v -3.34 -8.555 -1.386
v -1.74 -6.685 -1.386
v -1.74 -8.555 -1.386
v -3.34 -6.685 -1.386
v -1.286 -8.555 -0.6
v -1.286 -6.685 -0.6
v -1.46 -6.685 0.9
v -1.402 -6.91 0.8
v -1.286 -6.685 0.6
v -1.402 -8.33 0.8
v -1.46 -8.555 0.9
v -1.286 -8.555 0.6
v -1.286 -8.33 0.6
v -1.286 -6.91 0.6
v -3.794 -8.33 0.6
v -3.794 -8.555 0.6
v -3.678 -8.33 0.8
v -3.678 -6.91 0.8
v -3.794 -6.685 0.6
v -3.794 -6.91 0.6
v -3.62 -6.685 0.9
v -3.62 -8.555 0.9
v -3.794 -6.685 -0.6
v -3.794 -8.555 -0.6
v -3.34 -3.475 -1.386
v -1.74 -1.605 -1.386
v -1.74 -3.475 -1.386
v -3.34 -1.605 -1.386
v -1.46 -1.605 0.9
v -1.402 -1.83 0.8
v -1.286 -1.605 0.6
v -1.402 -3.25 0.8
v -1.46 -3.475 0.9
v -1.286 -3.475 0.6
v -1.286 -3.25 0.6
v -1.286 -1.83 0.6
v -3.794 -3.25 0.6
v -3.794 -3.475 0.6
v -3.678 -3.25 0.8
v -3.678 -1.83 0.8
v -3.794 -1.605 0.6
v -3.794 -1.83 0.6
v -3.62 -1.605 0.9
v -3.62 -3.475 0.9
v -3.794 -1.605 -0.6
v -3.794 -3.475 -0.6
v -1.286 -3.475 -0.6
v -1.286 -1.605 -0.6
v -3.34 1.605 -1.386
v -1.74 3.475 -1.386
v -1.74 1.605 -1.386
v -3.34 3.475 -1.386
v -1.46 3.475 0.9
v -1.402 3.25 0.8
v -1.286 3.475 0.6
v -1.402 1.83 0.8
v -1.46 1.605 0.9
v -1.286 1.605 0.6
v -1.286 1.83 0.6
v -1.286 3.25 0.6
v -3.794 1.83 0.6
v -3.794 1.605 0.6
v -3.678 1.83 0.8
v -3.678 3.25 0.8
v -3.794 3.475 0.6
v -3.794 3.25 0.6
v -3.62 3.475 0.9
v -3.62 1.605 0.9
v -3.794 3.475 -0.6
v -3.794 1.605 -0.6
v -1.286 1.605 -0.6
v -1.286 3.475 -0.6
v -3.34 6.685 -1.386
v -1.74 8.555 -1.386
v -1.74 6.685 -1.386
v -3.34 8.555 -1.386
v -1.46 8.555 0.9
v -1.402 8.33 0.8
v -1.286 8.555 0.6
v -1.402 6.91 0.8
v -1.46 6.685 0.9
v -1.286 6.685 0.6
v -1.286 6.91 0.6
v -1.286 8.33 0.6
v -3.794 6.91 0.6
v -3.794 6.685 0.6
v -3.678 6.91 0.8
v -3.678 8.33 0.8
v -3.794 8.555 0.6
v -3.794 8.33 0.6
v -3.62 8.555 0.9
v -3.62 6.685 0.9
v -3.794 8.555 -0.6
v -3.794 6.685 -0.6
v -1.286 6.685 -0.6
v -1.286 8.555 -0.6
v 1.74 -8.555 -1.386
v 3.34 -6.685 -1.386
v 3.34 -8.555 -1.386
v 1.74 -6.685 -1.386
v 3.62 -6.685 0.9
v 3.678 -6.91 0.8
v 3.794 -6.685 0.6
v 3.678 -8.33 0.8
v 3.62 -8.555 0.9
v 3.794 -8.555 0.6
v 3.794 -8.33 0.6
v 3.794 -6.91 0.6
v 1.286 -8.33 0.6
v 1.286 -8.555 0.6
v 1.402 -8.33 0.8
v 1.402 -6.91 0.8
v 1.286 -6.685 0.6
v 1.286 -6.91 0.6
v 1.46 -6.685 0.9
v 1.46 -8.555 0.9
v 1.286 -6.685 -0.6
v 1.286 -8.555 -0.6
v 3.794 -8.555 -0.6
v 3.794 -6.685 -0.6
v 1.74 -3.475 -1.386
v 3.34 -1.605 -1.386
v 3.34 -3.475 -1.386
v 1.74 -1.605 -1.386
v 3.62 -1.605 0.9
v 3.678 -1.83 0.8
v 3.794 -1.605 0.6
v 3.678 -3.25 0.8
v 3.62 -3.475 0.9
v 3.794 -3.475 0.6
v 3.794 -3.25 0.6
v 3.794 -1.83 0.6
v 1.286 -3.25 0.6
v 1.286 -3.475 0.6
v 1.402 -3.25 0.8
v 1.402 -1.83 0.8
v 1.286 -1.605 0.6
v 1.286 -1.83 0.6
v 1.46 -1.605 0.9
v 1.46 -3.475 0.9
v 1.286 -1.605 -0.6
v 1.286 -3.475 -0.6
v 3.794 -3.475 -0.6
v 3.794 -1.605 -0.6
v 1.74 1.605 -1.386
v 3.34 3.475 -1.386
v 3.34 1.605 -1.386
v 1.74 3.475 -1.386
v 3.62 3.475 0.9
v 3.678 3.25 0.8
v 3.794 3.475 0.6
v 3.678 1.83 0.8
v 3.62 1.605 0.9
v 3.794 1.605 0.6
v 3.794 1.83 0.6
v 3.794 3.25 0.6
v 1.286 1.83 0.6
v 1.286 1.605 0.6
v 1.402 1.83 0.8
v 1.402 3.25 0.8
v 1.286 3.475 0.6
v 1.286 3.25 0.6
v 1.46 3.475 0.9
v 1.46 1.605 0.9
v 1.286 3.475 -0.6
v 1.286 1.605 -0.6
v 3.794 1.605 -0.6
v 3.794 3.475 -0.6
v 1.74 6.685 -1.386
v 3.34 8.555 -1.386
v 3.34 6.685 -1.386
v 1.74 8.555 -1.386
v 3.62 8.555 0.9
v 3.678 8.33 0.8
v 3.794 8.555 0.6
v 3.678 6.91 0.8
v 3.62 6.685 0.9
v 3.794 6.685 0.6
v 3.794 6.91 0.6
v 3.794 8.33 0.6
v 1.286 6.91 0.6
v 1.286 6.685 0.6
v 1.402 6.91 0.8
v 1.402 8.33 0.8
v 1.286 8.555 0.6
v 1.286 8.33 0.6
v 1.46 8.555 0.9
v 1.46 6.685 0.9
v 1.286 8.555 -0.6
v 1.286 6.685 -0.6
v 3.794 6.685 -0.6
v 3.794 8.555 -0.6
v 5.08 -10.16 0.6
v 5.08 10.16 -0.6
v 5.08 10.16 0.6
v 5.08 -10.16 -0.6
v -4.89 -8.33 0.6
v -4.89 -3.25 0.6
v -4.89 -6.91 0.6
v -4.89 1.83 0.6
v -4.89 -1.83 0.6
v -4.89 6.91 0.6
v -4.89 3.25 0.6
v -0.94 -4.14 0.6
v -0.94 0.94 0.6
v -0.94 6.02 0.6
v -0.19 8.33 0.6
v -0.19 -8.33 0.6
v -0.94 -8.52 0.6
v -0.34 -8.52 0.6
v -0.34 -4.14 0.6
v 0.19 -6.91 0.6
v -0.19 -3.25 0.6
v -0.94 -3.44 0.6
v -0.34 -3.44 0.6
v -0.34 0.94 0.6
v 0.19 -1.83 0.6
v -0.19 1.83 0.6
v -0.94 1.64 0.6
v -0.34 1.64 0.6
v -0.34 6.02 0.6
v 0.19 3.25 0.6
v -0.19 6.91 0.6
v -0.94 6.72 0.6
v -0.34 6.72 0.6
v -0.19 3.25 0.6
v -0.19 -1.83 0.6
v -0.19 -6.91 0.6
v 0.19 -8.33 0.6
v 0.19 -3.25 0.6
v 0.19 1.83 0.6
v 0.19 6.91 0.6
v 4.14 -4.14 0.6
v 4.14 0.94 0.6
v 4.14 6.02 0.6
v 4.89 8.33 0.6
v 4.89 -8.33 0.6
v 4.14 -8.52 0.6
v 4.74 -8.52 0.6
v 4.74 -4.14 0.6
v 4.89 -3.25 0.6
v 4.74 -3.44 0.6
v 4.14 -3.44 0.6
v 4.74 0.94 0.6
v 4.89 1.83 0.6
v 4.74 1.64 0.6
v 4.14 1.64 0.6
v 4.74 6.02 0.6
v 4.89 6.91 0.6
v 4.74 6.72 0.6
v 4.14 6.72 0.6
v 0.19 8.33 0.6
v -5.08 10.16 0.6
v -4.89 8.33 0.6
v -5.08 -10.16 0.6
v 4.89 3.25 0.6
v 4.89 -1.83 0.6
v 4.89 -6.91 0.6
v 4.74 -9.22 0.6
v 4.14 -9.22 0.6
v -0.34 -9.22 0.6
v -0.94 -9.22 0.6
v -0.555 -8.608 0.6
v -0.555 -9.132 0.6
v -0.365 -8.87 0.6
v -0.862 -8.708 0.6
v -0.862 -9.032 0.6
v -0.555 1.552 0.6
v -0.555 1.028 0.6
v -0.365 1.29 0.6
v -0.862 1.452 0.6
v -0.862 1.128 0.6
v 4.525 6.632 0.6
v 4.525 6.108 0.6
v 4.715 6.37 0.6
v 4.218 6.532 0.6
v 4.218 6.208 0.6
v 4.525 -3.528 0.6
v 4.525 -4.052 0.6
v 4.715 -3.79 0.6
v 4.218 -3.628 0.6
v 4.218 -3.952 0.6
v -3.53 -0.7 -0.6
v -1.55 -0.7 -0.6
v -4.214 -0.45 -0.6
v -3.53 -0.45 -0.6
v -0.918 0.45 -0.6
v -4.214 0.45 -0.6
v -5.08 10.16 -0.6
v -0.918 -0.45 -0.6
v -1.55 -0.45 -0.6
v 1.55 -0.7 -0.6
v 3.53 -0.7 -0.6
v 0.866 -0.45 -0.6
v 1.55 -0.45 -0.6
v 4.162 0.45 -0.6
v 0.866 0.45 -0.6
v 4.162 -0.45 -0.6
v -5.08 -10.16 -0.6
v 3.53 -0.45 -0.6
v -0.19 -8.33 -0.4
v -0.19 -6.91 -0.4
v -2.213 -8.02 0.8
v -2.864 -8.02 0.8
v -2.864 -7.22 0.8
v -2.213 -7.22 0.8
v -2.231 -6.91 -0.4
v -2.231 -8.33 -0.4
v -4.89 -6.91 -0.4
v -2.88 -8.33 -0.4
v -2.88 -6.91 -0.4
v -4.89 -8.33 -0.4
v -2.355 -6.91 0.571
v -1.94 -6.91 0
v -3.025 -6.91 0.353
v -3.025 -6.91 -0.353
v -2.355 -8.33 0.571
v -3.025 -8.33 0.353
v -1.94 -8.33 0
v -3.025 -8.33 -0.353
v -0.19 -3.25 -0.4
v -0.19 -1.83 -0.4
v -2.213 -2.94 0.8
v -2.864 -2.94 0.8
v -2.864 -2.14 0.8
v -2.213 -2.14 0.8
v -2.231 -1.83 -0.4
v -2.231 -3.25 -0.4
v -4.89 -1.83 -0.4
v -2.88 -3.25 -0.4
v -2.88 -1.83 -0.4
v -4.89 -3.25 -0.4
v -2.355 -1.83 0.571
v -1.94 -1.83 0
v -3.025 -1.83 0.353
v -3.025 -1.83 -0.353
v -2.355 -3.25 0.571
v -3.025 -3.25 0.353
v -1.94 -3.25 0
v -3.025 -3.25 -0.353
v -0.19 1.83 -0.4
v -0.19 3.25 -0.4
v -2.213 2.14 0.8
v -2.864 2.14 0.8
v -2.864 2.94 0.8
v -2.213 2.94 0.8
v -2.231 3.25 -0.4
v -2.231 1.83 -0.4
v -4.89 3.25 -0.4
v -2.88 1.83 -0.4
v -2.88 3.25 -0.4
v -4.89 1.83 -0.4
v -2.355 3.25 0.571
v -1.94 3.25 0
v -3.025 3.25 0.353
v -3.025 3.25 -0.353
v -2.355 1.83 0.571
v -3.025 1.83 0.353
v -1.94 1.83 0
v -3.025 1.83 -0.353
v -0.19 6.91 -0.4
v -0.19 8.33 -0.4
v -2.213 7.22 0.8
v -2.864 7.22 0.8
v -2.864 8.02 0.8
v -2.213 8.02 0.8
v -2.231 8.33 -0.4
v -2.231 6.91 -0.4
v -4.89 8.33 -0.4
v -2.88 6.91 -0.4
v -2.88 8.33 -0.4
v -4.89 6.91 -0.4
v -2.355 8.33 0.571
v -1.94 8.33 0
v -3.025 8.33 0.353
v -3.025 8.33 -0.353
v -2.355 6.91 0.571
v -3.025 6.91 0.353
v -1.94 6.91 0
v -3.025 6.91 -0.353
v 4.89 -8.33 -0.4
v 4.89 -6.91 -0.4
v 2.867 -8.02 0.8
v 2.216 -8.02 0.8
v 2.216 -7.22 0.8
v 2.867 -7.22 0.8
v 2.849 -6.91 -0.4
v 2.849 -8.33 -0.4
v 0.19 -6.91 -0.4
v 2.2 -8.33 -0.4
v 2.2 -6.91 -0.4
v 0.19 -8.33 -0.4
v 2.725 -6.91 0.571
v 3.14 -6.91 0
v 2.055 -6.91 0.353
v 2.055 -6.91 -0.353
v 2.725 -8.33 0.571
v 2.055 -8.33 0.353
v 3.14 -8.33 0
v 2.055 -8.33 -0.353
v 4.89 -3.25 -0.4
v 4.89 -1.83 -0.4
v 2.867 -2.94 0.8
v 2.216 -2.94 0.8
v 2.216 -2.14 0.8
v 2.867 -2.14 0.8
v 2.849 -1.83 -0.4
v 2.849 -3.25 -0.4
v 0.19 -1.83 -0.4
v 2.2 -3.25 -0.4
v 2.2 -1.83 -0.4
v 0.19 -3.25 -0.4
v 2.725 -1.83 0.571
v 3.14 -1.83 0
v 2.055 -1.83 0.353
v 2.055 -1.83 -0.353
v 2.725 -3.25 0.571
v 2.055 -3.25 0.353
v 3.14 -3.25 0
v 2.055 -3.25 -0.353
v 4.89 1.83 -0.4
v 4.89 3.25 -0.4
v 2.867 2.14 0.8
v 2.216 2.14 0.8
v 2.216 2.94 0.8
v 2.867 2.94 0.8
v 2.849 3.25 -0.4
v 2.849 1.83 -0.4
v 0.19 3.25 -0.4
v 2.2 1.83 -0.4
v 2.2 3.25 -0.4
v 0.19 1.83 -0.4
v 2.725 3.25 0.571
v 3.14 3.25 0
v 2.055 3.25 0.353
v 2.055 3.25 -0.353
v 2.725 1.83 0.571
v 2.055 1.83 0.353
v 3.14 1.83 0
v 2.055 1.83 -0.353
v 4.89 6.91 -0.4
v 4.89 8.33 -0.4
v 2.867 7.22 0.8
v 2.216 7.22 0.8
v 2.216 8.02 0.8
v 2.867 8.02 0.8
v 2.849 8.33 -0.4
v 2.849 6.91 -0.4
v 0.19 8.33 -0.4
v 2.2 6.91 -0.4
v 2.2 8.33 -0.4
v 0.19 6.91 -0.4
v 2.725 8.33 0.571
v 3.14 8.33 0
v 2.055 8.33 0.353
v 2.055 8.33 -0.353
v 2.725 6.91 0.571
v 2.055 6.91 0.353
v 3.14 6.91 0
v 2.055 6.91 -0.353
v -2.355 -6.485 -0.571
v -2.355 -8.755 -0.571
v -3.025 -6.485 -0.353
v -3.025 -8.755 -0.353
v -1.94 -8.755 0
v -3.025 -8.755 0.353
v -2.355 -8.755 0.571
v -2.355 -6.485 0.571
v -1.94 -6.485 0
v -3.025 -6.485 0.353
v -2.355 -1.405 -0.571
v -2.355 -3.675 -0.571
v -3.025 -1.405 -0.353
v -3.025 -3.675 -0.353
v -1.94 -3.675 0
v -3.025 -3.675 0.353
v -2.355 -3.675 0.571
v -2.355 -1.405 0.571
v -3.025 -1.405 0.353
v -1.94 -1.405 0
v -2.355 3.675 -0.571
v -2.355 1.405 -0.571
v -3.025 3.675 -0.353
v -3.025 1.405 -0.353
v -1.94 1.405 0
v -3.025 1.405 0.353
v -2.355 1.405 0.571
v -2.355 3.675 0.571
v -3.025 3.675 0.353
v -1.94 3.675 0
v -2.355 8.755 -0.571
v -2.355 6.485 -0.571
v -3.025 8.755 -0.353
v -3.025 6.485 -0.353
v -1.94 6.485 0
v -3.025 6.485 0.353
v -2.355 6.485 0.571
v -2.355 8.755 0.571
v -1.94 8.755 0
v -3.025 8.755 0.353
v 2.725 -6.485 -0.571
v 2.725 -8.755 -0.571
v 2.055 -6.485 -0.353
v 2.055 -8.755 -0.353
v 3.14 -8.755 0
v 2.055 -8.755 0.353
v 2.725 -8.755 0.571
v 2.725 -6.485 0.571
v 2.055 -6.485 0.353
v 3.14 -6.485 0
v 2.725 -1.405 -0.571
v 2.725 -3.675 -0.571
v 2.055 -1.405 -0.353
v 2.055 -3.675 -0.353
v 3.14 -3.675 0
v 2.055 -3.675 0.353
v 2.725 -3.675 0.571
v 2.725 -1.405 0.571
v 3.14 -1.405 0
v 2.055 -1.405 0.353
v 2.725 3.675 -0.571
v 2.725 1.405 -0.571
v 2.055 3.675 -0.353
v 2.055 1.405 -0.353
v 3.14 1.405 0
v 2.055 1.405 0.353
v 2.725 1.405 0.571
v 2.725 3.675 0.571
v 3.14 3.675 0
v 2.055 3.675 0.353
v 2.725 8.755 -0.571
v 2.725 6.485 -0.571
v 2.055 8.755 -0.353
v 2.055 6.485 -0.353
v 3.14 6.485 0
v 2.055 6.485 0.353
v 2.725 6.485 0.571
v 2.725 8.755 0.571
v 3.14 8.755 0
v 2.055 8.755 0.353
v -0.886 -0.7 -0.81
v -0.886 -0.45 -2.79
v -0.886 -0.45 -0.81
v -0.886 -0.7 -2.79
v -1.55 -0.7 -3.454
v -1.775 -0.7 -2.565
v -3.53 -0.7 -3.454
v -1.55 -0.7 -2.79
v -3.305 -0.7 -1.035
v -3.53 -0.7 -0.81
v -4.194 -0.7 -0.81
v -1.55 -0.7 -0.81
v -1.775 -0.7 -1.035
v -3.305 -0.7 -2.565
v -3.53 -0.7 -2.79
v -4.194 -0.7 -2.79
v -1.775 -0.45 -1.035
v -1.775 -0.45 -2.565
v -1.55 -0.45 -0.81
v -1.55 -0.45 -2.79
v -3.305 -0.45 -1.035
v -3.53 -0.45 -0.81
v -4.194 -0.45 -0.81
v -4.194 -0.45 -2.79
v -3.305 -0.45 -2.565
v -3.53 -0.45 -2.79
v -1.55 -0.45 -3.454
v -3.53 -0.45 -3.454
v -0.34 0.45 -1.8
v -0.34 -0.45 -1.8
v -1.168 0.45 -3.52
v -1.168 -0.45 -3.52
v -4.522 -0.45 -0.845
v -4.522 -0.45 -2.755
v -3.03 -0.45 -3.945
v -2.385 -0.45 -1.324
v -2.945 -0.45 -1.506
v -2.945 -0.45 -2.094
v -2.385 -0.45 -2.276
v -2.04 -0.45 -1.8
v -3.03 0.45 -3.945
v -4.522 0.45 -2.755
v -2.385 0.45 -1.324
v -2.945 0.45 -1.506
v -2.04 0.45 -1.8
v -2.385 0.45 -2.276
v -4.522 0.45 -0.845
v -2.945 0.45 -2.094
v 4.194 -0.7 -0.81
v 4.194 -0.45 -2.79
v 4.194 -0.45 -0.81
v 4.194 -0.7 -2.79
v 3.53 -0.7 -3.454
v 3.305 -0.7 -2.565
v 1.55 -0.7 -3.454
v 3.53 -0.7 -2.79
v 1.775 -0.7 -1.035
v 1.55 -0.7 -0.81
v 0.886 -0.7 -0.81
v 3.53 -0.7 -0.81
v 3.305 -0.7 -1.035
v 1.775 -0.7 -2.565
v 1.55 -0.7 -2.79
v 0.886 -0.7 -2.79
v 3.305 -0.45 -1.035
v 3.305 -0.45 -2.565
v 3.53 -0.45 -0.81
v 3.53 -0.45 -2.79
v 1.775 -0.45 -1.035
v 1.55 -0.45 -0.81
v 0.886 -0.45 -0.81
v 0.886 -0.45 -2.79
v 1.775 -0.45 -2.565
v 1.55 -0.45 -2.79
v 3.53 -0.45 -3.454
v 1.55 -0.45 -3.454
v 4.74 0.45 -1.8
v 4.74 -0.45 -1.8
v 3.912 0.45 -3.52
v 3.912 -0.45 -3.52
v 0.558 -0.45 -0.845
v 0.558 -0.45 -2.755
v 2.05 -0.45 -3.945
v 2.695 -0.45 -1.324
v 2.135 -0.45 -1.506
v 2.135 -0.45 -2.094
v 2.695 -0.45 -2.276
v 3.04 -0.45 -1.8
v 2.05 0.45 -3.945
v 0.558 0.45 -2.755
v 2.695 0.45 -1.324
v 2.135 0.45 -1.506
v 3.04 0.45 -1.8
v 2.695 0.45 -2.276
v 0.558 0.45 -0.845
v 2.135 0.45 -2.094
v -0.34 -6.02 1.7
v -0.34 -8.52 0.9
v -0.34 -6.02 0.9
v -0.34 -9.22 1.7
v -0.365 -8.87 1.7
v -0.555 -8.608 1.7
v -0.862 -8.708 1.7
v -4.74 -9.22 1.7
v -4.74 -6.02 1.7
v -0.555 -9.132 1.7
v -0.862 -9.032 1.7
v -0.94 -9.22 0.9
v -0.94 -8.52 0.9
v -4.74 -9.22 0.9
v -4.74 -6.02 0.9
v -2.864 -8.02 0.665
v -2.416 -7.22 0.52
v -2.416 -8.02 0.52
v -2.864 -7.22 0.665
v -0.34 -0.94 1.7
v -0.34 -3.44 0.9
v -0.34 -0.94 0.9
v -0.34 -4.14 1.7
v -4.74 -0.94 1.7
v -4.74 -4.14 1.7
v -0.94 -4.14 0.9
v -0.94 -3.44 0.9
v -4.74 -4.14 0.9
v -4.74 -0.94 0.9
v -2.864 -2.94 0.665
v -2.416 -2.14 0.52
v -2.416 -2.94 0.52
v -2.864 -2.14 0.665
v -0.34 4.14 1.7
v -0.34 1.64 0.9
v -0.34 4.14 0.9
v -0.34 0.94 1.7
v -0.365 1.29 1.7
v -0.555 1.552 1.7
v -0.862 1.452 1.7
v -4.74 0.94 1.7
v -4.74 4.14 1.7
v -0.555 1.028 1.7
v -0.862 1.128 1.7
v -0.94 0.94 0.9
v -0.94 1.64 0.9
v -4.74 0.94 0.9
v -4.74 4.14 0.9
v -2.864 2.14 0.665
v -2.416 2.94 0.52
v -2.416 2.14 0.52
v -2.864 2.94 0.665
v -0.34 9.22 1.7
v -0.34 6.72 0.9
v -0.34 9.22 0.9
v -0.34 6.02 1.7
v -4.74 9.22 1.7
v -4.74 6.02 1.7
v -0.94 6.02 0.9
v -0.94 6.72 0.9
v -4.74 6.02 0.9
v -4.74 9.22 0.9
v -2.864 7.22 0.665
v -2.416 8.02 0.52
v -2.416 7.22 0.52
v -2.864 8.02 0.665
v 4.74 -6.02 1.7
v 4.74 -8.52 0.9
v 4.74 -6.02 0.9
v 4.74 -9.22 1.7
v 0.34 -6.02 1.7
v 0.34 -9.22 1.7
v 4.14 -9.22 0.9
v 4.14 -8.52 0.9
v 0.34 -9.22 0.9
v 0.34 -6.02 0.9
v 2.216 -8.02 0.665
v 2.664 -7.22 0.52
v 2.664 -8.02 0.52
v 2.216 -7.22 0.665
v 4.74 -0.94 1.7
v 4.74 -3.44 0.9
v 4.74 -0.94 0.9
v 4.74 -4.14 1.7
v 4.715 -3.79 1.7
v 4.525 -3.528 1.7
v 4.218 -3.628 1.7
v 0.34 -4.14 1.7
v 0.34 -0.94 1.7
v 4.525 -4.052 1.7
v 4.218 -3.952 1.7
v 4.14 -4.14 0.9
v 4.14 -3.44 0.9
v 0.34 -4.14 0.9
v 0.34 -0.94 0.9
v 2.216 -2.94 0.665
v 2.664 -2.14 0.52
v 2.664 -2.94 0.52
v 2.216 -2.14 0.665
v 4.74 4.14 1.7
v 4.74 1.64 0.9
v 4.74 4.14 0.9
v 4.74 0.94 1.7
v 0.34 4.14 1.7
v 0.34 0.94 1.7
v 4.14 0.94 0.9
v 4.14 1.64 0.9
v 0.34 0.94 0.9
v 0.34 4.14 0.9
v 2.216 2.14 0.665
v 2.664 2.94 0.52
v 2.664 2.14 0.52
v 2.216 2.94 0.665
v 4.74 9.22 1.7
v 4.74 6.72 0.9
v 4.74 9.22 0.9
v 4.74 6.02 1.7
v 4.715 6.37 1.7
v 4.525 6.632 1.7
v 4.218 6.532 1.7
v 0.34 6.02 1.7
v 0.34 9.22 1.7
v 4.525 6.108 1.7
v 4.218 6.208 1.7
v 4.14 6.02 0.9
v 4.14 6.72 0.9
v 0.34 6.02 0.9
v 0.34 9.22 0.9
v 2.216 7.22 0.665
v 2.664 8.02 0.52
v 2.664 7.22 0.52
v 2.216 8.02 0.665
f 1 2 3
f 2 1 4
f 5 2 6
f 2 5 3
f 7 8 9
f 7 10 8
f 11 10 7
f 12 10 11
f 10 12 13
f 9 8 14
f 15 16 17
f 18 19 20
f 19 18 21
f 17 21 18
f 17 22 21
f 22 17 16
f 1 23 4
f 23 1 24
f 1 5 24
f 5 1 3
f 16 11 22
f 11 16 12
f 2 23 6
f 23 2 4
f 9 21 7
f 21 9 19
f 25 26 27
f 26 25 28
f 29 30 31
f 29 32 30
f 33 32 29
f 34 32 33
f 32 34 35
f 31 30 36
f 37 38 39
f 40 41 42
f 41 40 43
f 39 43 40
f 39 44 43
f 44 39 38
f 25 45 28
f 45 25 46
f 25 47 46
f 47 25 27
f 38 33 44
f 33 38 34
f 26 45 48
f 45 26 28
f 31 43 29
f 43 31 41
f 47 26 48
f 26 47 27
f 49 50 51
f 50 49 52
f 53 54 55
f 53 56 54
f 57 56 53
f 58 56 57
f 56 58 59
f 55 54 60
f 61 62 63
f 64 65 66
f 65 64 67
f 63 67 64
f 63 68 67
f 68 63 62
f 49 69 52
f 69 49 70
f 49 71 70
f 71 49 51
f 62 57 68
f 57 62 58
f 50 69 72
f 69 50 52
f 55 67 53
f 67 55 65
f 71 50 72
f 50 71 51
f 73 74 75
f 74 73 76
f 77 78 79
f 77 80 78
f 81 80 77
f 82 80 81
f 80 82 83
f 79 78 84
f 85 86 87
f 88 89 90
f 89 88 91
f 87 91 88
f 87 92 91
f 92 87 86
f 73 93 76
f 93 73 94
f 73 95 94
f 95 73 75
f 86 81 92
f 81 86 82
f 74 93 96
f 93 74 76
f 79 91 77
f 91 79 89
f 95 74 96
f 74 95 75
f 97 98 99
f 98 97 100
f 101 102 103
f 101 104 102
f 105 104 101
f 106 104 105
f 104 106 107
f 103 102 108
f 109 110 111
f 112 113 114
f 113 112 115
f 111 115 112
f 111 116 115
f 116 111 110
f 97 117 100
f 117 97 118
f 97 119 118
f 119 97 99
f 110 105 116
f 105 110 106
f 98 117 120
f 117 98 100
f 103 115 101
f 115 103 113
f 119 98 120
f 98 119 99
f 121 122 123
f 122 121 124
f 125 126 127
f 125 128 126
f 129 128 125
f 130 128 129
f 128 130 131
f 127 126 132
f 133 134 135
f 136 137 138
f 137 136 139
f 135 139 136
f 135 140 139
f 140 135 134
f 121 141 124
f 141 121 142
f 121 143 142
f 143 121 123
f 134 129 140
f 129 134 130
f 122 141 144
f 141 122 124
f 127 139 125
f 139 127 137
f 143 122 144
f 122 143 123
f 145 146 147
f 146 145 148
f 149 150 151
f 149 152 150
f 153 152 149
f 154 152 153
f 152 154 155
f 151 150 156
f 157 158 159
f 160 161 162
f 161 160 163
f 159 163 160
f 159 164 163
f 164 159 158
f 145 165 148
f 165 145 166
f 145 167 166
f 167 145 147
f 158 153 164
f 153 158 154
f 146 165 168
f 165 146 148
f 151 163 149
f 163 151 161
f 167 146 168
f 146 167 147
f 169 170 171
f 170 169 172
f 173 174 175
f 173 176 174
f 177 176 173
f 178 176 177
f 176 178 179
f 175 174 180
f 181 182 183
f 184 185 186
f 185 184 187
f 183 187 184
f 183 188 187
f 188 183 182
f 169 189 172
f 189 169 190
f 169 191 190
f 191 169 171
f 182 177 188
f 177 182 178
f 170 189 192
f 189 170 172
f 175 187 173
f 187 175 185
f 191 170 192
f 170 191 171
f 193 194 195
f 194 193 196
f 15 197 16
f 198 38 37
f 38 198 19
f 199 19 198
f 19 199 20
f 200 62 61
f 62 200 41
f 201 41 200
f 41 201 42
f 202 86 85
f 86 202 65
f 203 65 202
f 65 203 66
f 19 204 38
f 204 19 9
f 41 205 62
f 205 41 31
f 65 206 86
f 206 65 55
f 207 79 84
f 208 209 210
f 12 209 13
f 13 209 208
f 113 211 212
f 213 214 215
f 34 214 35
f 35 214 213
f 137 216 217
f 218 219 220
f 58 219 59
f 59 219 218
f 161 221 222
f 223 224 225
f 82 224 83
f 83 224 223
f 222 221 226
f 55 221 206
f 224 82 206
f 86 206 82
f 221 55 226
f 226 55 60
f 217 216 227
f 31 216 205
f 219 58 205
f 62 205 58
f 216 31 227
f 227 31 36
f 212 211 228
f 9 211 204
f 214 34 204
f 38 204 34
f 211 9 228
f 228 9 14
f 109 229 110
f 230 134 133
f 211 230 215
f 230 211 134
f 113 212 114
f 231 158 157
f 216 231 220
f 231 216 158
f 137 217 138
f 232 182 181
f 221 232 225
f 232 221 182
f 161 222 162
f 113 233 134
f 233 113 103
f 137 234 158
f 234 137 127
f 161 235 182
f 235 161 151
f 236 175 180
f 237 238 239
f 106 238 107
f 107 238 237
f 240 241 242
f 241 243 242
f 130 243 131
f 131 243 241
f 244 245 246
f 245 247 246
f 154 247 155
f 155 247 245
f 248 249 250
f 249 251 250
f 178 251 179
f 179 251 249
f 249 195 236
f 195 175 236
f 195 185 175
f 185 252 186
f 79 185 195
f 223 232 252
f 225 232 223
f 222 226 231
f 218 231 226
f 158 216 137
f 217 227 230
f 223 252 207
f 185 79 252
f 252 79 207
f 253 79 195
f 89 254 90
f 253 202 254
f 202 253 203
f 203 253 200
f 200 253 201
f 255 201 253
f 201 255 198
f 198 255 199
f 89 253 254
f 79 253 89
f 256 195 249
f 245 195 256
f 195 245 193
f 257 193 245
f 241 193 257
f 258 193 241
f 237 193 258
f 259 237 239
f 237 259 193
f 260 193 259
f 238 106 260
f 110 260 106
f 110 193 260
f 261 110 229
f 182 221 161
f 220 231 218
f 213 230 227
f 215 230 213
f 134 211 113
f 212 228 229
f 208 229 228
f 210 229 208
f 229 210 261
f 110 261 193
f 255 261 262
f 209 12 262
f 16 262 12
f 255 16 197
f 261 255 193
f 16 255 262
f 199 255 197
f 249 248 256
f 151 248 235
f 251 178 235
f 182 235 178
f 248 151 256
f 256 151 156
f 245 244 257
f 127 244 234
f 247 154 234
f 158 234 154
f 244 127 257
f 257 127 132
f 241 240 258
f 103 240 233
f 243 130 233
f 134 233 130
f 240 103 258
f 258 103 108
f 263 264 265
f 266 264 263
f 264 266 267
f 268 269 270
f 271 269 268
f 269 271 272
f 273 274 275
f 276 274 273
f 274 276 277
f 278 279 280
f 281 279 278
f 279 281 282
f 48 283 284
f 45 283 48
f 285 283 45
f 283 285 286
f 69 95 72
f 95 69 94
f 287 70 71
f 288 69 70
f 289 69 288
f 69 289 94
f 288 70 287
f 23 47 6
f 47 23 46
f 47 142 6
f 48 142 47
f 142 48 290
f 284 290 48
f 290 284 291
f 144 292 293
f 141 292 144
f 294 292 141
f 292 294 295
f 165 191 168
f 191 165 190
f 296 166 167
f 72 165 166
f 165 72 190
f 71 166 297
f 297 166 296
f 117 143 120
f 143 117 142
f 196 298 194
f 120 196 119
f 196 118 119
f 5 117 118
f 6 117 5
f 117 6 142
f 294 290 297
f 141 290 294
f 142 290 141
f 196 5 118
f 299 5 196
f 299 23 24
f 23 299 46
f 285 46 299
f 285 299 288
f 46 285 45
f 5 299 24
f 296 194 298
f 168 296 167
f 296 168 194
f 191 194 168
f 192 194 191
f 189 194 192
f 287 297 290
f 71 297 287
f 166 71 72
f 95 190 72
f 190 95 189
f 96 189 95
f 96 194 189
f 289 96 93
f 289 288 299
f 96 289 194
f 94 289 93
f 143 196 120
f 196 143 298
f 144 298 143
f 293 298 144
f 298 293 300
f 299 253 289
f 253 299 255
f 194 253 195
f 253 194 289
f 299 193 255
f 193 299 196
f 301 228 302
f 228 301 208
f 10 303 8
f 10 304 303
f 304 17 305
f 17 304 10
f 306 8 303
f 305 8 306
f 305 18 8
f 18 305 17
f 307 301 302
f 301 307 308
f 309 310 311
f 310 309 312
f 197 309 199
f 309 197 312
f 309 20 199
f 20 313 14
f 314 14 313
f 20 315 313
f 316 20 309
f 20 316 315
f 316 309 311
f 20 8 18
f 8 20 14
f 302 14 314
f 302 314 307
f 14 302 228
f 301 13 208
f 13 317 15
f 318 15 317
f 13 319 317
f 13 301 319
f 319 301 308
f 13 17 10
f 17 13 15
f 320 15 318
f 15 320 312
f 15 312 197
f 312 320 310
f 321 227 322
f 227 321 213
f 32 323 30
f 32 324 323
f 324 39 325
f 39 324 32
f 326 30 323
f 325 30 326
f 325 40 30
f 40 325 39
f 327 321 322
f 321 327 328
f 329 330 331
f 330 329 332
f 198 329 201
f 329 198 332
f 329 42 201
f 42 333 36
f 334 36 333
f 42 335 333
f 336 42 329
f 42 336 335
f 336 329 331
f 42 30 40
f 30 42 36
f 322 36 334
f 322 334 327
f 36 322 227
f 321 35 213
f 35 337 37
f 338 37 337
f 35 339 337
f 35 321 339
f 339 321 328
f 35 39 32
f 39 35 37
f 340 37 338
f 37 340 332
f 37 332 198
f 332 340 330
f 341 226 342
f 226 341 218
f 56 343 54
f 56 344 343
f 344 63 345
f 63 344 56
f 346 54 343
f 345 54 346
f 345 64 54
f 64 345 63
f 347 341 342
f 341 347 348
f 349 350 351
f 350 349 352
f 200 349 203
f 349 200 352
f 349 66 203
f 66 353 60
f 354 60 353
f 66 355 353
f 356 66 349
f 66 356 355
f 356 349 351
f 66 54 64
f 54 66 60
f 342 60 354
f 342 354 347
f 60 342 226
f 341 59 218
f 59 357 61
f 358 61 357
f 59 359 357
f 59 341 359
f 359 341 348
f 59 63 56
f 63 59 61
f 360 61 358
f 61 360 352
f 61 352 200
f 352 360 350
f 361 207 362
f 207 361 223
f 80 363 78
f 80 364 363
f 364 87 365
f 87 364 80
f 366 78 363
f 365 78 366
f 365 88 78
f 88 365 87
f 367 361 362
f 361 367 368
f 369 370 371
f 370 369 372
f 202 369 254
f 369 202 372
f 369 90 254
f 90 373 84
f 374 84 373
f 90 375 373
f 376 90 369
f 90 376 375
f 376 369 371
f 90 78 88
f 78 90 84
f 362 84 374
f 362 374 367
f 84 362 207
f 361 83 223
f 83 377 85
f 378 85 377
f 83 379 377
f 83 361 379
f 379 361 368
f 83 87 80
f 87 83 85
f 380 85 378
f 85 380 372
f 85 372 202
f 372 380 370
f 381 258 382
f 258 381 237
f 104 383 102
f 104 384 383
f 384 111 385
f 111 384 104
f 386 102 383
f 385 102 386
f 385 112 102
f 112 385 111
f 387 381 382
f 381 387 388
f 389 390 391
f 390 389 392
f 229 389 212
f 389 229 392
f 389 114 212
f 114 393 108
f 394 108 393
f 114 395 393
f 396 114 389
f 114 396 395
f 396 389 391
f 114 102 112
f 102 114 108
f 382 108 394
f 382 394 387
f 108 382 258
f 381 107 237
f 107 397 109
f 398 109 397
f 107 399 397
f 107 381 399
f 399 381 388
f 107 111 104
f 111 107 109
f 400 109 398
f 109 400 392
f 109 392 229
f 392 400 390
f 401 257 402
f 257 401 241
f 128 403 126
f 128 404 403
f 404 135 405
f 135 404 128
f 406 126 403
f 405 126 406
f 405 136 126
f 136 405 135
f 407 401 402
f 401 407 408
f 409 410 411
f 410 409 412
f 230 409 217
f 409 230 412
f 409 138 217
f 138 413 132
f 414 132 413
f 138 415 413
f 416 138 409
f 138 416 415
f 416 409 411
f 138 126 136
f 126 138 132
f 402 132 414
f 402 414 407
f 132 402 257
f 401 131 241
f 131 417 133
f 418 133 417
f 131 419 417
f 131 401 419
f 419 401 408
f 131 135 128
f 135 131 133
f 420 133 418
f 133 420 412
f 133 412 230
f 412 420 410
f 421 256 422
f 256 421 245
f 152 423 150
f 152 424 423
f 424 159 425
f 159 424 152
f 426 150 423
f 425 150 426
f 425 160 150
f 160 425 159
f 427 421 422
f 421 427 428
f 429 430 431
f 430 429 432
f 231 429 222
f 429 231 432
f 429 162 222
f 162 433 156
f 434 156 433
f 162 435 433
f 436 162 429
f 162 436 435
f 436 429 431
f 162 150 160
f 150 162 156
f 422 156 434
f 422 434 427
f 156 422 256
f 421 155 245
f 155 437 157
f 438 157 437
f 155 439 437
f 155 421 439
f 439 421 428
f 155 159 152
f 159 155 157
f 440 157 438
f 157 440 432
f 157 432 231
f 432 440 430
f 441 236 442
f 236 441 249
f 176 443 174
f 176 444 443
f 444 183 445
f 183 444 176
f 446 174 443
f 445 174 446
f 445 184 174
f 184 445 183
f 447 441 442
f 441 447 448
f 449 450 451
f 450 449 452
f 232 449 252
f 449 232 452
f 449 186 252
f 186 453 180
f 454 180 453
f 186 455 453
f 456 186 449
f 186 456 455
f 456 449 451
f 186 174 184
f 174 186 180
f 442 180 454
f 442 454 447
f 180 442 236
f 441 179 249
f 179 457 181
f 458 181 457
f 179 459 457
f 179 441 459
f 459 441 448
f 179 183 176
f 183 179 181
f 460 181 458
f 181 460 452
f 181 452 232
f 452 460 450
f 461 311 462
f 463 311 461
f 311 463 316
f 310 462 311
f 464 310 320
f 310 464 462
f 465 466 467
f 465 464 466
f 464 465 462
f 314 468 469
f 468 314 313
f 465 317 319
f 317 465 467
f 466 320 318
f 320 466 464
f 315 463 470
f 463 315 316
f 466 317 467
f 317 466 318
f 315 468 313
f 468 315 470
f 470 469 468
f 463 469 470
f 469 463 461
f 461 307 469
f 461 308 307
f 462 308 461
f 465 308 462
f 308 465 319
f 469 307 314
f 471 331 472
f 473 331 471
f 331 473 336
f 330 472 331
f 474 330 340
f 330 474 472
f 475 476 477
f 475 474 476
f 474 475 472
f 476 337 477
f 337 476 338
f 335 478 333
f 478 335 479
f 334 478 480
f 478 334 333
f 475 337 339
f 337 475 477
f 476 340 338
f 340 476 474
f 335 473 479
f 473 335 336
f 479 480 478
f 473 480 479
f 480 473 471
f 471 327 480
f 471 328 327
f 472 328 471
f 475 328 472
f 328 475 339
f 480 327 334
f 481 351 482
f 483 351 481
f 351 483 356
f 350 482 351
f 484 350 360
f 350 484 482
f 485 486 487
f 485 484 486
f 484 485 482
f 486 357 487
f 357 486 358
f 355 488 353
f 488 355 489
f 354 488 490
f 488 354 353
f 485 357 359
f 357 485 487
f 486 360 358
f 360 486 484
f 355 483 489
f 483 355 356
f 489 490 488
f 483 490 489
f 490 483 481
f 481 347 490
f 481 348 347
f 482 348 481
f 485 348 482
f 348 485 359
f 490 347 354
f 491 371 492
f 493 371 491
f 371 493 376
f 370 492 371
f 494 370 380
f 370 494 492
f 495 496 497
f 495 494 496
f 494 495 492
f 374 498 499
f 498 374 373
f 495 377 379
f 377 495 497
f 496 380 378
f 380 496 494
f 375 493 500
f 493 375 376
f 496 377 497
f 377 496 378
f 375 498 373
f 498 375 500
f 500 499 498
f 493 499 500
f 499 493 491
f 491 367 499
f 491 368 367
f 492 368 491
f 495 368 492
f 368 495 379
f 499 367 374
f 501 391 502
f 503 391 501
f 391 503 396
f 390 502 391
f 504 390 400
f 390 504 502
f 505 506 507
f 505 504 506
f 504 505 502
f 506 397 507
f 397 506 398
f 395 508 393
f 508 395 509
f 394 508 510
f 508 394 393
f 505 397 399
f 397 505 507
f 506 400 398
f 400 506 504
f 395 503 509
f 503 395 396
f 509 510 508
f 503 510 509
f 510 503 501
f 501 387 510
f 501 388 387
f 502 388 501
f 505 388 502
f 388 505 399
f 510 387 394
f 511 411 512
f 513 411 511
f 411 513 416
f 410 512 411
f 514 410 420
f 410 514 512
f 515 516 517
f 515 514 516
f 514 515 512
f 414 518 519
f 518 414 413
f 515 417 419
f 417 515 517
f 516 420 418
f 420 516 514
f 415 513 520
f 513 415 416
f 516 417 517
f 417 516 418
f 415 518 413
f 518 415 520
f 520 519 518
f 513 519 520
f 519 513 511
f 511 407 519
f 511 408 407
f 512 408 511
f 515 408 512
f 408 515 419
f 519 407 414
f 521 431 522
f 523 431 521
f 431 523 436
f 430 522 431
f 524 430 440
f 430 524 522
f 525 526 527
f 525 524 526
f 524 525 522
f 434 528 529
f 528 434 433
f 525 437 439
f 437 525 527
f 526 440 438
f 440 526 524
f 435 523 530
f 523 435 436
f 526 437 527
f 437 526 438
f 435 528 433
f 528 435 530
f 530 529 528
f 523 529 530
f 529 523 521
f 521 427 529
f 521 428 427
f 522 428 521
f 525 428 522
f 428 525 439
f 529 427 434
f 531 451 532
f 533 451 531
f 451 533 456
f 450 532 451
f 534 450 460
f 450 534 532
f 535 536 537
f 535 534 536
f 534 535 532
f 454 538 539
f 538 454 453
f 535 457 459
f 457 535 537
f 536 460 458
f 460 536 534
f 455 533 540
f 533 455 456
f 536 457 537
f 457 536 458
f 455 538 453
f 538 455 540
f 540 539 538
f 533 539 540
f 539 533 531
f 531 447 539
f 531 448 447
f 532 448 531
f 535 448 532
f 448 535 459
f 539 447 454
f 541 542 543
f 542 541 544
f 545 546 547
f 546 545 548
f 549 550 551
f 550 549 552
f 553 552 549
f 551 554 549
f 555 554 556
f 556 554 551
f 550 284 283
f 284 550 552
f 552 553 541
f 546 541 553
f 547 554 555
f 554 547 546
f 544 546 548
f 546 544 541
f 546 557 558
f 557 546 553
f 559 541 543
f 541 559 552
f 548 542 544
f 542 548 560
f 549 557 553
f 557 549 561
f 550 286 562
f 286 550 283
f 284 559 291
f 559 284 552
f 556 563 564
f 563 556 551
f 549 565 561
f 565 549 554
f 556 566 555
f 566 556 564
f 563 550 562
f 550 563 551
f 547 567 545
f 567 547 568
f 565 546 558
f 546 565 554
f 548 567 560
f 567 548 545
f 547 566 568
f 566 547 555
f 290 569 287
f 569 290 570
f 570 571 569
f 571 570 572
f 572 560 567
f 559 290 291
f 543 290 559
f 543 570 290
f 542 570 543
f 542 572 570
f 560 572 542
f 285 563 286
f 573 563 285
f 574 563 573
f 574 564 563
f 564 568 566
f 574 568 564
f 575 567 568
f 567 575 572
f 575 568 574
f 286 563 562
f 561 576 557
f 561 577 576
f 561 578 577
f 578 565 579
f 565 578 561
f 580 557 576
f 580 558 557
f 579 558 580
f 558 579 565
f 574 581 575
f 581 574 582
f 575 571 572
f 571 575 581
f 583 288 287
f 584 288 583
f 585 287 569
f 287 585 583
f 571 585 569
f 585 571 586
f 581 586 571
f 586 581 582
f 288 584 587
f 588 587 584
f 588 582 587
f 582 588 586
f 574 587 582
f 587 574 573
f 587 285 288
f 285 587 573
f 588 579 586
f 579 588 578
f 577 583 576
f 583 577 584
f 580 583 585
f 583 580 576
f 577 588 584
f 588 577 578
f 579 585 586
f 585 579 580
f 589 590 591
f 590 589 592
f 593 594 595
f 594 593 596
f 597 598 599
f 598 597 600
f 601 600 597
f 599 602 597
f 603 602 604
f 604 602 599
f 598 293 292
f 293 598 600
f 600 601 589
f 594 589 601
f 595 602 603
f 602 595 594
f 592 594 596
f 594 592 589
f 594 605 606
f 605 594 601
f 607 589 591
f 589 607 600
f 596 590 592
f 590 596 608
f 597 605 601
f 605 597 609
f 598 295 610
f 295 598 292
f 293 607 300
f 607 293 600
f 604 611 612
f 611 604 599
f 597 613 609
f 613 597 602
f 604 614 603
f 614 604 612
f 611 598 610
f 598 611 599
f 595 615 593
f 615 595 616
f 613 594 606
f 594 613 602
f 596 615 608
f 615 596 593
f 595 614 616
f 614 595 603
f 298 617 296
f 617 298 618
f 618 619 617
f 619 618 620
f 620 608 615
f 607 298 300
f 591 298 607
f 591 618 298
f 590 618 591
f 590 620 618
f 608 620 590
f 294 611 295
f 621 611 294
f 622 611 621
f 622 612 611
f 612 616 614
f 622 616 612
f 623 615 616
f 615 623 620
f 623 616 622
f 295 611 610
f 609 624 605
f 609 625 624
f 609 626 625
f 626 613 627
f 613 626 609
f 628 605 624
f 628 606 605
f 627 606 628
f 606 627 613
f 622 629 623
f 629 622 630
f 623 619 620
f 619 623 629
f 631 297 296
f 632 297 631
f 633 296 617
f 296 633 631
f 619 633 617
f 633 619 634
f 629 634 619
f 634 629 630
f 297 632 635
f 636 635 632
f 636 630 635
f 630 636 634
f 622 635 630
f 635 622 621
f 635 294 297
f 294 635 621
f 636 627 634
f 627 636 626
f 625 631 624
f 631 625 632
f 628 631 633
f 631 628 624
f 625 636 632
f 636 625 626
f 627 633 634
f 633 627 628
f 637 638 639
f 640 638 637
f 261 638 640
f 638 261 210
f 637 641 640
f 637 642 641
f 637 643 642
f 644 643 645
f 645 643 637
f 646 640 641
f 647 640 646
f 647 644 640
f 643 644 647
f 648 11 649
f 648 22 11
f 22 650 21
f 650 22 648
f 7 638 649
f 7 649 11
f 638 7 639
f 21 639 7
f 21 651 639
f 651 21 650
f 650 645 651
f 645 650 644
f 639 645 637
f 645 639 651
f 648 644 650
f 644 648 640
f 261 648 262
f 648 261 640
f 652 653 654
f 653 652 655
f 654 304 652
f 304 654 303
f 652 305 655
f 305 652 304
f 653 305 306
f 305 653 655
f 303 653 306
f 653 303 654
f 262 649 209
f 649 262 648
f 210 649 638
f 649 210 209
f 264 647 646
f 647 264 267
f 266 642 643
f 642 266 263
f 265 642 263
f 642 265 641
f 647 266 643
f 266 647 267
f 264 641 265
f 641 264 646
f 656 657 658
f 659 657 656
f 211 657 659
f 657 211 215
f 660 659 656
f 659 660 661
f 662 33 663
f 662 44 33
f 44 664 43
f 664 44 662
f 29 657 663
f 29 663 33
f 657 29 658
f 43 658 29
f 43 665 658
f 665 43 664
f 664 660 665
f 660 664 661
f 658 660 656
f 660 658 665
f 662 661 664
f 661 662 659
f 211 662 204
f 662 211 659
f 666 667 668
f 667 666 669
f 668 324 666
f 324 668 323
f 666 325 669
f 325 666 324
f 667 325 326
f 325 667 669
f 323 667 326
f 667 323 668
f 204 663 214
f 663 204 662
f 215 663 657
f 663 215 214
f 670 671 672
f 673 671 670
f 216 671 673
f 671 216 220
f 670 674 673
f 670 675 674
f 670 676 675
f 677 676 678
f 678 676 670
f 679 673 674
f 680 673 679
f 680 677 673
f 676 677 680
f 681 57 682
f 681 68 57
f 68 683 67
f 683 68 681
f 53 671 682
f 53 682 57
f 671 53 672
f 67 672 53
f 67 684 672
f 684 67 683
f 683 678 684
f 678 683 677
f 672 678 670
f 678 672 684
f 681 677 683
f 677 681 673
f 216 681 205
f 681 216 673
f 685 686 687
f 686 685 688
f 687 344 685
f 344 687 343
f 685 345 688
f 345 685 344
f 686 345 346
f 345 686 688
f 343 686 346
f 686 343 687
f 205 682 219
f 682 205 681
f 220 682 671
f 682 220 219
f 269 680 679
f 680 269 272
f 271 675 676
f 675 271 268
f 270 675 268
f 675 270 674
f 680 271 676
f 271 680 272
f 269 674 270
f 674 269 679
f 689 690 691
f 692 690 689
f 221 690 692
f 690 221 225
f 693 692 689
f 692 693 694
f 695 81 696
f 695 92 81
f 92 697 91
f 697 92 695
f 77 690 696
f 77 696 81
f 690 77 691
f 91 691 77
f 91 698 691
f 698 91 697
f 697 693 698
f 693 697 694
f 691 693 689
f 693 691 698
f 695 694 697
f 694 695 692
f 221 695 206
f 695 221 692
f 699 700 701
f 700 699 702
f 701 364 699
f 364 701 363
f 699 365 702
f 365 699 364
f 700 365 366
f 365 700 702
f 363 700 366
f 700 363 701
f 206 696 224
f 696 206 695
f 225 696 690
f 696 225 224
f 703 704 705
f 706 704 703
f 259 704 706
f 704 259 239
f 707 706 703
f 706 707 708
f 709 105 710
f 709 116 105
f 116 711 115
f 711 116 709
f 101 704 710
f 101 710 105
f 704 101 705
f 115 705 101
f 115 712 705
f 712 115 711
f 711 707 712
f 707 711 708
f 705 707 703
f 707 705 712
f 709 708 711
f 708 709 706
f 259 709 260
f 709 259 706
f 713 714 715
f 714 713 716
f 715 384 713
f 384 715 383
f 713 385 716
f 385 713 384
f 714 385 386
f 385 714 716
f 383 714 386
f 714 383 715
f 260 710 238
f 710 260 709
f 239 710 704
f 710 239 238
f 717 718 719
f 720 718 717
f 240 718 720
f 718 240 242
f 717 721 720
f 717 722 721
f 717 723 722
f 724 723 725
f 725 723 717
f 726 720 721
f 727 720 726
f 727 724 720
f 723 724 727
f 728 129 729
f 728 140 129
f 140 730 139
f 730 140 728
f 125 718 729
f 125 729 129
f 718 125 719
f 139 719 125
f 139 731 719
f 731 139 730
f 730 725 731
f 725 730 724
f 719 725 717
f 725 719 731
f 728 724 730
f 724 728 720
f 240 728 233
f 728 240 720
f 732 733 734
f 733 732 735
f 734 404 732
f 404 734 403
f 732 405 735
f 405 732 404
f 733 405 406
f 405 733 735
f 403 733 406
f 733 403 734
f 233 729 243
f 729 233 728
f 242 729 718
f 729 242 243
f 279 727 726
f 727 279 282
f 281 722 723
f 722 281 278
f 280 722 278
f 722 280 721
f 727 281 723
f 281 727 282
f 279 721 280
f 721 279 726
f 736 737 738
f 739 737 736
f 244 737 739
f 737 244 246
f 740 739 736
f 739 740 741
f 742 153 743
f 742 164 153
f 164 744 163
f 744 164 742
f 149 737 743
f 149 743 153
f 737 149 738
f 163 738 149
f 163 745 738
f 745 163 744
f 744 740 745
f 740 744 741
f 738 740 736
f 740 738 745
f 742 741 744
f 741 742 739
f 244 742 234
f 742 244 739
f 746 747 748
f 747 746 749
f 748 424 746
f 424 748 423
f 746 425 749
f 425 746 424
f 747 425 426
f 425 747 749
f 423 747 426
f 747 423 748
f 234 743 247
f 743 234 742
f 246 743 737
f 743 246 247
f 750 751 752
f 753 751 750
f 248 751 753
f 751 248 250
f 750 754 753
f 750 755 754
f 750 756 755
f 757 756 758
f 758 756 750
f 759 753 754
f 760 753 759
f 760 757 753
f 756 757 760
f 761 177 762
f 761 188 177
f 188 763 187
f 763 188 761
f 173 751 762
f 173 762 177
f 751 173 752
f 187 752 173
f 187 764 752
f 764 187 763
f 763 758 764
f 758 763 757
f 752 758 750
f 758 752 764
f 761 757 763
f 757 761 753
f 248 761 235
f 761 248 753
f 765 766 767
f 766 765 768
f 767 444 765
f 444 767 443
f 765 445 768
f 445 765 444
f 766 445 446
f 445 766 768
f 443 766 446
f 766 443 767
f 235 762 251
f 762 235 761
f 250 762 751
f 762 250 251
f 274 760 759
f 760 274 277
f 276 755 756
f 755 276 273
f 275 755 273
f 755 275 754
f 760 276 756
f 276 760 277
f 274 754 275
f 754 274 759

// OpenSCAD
// test11 - S3 selector fan-out coupon, parametric.
//
// This is the cheapest geometric gate for S3. It asks one question:
//   Can FOUR independently rockable selector fingers plus one shared 4-plane
//   cam bank be packed inside ONE 5.08 mm cell band, and can a 2x4 section be
//   printed on the X1C with a 0.4 mm nozzle?
//
// It is a *fit coupon*, not a mechanism. It has no springs, no drive and no
// tooth engagement; those are Stage-C questions after this geometry is printed
// and measured.
//
// Render:
//   openscad -o selector_fanout_coupon.stl selector_fanout_coupon.scad
//   openscad -D 'part="bank"' ...
//   openscad -D 'part="finger"' ...
//   openscad -D 'part="assembled_2x4"' ...

PITCH = 5.08;          // project pitch
ROWS_PER_STATION = 4;  // one station services 4 rows
BAND = PITCH / ROWS_PER_STATION;   // 1.27 mm axial land per row on the cam bank

// --- printed finger geometry -------------------------------------------------
FINGER_T = 0.80;       // finger thickness along the row axis (band is 1.27)
FINGER_H = 3.20;       // finger height (rocker)
FINGER_L = 4.40;       // finger length along travel
PIVOT_D = 0.80;        // printed pivot boss diameter
// DND-4: designed radial journal clearance between the finger boss and the base
// socket. Without a designed clearance the pivot prints in place and its
// freedom (protocol gate M3) is a slicer unknown -> the analytic gate returns
// INCONCLUSIVE. A positive designed clearance converts M3 from unmodelled to
// analytic. 0.20 mm is chosen so the diametral free play (0.40 mm) clears the
// 0.20 mm free-gap floor even after worst-case boss/socket tolerance (+/-0.06
// each), and 0.40 mm also clears the 0.4 mm slot rule. CAD-set dimension.
PIVOT_CLR = 0.20;      // radial clearance, each side
PIVOT_SOCKET_D = PIVOT_D + 2 * PIVOT_CLR;  // 1.20 mm socket bore
NOTCH_D = 0.55;        // selector notch diameter (state write feature)
MIN_WEB = 0.24;        // target minimum printed web at 0.4 mm nozzle

// --- cam bank geometry -------------------------------------------------------
BANK_R = 2.20;         // bank radius (fits under 5.08 column)
LAND_H = 0.90;         // cam land height
HUB_D = 1.20;
SHAFT_D = 1.00;        // printed shaft, D-shape flat optional

part = "assembled_2x4";

module finger(engaged = true) {
    difference() {
        union() {
            // rocker body
            translate([0, 0, FINGER_T / 2])
                cube([FINGER_L, FINGER_H, FINGER_T], center = true);
            // pivot boss
            rotate([90, 0, 0]) cylinder(d = PIVOT_D, h = FINGER_T, center = true);
            // toe that meets the cam land
            translate([FINGER_L / 2 - 0.3, -FINGER_H / 2 + 0.35, 0])
                cube([0.6, 0.7, FINGER_T], center = true);
        }
        // selector notch - present = this finger writes when the cam is at
        // its plane; absent = finger rides the land
        if (engaged)
            translate([FINGER_L / 2 - 0.3, -FINGER_H / 2 + 0.35, 0])
                cylinder(d = NOTCH_D, h = FINGER_T * 2, center = true);
    }
}

module cam_bank() {
    difference() {
        union() {
            cylinder(d = BANK_R * 2, h = LAND_H, center = true);
            // four raised lands, one per row, 90 deg apart
            for (i = [0:ROWS_PER_STATION - 1])
                rotate([0, 0, i * 360 / ROWS_PER_STATION])
                    translate([BANK_R * 0.55, 0, LAND_H / 2])
                        cube([BAND * 0.7, BANK_R * 0.9, 0.5], center = true);
        }
        // shaft bore
        cylinder(d = SHAFT_D, h = LAND_H * 3, center = true);
    }
}

module coupon_base() {
    // 2 cells x 4 rows footprint, open frame so fingers can be inspected.
    // DND-4: a pivot post at each cell centre carries a socket bore sized
    // PIVOT_SOCKET_D = PIVOT_D + 2*PIVOT_CLR, giving the finger boss a designed
    // radial journal clearance. This is what makes protocol gate M3 analytic.
    difference() {
        union() {
            cube([PITCH * 2, PITCH * 4, 1.20], center = true);
            for (x = [0, 1], y = [0:3])
                translate([(x - 0.5) * PITCH, (y - 1.5) * PITCH, 0])
                    rotate([90, 0, 0])
                        cylinder(d = PIVOT_D + 2 * 1.2, h = BAND + 0.6, center = true);
        }
        // finger clearance slot (per cell)
        for (x = [0, 1], y = [0:3])
            translate([(x - 0.5) * PITCH, (y - 1.5) * PITCH, 0.2])
                cube([FINGER_L + 0.3, BAND + 0.15, 1.2], center = true);
        // socket bores: designed radial clearance around each finger boss
        for (x = [0, 1], y = [0:3])
            translate([(x - 0.5) * PITCH, (y - 1.5) * PITCH, 0])
                rotate([90, 0, 0])
                    cylinder(d = PIVOT_SOCKET_D, h = BAND + 1.0, center = true);
    }
}

module assembled_2x4() {
    coupon_base();
    // cam banks under each column
    for (x = [0, 1])
        translate([(x - 0.5) * PITCH, 0, -1.8]) rotate([90, 0, 0]) cam_bank();
    // four fingers per column, one per row
    for (x = [0, 1], y = [0:3])
        translate([(x - 0.5) * PITCH, (y - 1.5) * PITCH, 0.9])
            rotate([0, 0, 0]) finger((x + y) % 2 == 0);   // checkerboard
}

if (part == "finger") finger(true);
else if (part == "finger_blank") finger(false);
else if (part == "bank") cam_bank();
else if (part == "base") coupon_base();
else assembled_2x4();
